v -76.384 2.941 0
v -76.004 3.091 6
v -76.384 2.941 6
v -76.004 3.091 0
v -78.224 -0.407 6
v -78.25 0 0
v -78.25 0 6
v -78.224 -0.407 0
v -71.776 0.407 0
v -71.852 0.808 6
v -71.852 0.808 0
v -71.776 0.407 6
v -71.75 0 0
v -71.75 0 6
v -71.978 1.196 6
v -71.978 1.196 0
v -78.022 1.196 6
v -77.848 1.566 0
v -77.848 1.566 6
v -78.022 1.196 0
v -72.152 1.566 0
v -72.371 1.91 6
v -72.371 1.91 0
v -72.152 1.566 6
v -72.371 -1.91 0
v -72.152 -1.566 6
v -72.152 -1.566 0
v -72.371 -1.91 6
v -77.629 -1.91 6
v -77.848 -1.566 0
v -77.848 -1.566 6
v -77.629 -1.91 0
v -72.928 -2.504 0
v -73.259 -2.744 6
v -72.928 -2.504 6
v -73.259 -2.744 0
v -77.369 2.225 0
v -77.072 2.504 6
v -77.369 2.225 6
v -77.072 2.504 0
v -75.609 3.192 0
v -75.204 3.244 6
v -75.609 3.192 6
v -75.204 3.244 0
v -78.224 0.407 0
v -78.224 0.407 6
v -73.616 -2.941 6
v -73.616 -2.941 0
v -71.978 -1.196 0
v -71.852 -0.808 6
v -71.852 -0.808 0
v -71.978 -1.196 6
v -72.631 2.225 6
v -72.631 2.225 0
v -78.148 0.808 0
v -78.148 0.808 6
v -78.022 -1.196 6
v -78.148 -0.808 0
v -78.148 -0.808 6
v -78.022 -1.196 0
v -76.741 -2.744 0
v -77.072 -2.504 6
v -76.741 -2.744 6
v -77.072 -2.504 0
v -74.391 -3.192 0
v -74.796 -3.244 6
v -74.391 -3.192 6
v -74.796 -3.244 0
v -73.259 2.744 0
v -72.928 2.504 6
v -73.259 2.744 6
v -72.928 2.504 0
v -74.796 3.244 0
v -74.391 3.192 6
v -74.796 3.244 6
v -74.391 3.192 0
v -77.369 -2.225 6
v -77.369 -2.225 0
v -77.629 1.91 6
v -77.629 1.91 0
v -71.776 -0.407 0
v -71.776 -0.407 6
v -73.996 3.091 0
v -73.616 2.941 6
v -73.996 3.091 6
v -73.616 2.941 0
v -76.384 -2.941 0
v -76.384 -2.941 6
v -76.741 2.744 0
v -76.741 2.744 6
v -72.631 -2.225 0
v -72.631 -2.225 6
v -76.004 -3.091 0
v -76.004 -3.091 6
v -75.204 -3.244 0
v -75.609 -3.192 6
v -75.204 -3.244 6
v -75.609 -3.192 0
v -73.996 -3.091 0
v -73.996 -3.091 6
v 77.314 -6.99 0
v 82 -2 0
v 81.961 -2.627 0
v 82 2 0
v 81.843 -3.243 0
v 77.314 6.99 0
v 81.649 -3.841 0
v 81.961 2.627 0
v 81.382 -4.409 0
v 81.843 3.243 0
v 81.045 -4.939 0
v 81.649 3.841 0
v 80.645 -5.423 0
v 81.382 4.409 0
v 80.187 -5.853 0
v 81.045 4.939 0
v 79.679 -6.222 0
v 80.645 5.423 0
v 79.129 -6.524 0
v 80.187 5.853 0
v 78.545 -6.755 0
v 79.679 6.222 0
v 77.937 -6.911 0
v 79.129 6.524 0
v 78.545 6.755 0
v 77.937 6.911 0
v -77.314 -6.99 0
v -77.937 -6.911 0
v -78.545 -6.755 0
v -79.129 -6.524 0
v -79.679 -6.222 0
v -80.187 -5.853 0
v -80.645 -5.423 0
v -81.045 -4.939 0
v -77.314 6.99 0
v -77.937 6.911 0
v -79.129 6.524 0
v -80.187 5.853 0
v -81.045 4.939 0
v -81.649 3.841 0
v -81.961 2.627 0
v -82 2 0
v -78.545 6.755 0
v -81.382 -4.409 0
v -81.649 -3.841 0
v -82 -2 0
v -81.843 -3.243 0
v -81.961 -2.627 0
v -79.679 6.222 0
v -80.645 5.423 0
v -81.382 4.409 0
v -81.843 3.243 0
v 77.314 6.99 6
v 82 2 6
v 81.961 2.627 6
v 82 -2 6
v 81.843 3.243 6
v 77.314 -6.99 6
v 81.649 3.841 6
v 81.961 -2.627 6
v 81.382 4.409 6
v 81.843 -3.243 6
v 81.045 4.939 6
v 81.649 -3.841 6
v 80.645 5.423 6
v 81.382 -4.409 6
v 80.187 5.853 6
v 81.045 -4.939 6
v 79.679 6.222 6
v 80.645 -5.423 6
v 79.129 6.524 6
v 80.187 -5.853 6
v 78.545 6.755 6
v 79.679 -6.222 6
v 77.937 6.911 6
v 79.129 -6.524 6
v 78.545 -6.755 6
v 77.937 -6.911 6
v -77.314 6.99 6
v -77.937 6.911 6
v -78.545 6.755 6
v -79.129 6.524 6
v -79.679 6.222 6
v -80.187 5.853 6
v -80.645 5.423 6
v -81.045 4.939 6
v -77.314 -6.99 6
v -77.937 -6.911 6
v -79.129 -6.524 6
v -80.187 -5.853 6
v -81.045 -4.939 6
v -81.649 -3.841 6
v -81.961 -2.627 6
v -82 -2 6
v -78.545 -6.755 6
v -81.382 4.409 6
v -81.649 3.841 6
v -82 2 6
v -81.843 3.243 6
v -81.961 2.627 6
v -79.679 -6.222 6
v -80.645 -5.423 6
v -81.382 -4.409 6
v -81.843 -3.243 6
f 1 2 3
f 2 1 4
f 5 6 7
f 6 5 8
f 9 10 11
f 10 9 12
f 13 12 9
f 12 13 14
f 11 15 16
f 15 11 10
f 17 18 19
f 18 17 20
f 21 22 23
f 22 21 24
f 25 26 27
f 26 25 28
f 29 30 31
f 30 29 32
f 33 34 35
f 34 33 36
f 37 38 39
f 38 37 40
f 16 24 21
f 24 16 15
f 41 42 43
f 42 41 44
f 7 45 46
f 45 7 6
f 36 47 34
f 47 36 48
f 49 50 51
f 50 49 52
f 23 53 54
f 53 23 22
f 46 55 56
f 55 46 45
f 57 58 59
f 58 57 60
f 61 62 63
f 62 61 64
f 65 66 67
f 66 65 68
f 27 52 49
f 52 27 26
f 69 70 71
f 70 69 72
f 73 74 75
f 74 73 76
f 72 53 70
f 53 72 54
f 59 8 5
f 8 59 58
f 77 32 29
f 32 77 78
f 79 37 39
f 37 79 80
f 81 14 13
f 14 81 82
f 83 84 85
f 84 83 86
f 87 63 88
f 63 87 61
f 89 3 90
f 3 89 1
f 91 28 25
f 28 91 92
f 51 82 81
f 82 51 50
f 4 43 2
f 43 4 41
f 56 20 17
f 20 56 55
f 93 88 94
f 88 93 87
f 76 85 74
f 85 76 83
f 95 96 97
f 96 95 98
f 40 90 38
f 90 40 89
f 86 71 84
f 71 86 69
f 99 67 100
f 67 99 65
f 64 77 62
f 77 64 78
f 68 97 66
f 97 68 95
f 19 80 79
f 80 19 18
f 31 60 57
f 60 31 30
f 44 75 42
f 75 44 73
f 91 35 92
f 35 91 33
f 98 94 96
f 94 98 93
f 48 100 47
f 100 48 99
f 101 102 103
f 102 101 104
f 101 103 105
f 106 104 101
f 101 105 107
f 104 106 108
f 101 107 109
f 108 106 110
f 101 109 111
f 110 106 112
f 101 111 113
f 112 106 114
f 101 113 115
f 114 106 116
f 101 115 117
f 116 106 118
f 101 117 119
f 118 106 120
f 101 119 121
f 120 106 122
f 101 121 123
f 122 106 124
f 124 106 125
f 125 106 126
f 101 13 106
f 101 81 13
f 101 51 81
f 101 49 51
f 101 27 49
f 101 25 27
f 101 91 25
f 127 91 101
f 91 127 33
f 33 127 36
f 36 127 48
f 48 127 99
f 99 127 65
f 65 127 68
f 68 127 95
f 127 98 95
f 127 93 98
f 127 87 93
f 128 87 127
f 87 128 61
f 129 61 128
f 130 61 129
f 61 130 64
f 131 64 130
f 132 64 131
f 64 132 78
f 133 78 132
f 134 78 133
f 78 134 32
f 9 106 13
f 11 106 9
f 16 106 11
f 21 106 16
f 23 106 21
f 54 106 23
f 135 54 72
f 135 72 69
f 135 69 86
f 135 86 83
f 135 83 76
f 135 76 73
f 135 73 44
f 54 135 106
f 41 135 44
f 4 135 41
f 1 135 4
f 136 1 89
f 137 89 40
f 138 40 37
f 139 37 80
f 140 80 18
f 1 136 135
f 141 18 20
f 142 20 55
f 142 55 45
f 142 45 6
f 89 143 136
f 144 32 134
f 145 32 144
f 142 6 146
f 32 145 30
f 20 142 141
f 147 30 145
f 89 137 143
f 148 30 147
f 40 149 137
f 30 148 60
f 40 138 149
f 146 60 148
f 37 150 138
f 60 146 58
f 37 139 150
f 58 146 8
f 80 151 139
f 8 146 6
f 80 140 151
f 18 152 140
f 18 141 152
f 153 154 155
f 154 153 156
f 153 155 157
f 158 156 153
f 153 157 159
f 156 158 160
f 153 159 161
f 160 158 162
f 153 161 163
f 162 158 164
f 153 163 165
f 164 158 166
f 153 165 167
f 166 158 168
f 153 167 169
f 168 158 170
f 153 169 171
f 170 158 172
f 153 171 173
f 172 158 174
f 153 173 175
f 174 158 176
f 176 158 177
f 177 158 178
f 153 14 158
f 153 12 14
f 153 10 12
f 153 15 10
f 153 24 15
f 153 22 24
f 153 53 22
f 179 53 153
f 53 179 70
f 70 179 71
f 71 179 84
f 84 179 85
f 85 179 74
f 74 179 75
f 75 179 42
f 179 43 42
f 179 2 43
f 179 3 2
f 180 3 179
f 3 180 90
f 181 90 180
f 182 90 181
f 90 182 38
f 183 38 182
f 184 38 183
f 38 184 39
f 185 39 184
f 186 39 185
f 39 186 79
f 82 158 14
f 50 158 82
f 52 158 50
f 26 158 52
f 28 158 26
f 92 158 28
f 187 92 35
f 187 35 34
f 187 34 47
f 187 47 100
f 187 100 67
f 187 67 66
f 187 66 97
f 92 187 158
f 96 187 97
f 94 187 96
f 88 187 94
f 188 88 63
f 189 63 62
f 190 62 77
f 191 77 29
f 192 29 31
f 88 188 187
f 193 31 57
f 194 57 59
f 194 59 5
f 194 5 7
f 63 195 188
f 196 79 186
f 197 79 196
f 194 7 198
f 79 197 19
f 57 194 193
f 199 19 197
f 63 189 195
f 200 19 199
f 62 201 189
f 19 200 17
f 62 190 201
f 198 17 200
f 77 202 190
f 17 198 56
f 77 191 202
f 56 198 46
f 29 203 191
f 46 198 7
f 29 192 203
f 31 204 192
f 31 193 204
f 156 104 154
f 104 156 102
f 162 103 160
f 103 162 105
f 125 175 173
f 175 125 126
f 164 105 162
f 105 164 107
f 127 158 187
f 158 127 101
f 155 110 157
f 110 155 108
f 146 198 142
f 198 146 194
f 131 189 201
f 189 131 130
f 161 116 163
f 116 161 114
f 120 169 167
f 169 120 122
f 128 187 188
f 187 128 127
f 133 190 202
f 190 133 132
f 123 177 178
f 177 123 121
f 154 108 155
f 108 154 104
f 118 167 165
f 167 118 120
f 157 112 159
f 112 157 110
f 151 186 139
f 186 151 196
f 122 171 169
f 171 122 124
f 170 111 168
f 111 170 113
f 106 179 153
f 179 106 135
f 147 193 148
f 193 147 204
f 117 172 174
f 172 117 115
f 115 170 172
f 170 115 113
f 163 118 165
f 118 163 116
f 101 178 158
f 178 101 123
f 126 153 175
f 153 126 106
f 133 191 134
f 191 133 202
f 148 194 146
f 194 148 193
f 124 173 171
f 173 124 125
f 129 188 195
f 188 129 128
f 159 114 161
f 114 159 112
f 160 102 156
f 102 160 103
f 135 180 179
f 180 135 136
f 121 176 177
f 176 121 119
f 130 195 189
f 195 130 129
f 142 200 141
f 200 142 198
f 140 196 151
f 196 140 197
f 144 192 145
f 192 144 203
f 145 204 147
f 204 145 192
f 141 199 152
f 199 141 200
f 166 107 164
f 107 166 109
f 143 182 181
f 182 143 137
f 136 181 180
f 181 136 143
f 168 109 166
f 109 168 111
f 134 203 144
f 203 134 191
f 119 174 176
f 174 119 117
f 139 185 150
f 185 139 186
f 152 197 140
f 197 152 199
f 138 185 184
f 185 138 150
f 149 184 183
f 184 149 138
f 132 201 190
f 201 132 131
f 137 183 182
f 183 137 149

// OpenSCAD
$fn = 50;


difference() {
	union() {
		hull() {
			translate(v = [-77.0000000000, 2.0000000000, 0]) {
				cylinder(h = 6, r = 5);
			}
			translate(v = [77.0000000000, 2.0000000000, 0]) {
				cylinder(h = 6, r = 5);
			}
			translate(v = [-77.0000000000, -2.0000000000, 0]) {
				cylinder(h = 6, r = 5);
			}
			translate(v = [77.0000000000, -2.0000000000, 0]) {
				cylinder(h = 6, r = 5);
			}
		}
	}
	union() {
		translate(v = [-75.0000000000, 0.0000000000, 0]) {
			cylinder(h = 6, r = 3.2500000000);
		}
		translate(v = [-75.0000000000, 0.0000000000, 0]) {
			cylinder(h = 6, r = 1.8000000000);
		}
		translate(v = [-75.0000000000, 0.0000000000, 0]) {
			cylinder(h = 6, r = 1.8000000000);
		}
		translate(v = [-75.0000000000, 0.0000000000, 0]) {
			cylinder(h = 6, r = 1.8000000000);
		}
	}
}
